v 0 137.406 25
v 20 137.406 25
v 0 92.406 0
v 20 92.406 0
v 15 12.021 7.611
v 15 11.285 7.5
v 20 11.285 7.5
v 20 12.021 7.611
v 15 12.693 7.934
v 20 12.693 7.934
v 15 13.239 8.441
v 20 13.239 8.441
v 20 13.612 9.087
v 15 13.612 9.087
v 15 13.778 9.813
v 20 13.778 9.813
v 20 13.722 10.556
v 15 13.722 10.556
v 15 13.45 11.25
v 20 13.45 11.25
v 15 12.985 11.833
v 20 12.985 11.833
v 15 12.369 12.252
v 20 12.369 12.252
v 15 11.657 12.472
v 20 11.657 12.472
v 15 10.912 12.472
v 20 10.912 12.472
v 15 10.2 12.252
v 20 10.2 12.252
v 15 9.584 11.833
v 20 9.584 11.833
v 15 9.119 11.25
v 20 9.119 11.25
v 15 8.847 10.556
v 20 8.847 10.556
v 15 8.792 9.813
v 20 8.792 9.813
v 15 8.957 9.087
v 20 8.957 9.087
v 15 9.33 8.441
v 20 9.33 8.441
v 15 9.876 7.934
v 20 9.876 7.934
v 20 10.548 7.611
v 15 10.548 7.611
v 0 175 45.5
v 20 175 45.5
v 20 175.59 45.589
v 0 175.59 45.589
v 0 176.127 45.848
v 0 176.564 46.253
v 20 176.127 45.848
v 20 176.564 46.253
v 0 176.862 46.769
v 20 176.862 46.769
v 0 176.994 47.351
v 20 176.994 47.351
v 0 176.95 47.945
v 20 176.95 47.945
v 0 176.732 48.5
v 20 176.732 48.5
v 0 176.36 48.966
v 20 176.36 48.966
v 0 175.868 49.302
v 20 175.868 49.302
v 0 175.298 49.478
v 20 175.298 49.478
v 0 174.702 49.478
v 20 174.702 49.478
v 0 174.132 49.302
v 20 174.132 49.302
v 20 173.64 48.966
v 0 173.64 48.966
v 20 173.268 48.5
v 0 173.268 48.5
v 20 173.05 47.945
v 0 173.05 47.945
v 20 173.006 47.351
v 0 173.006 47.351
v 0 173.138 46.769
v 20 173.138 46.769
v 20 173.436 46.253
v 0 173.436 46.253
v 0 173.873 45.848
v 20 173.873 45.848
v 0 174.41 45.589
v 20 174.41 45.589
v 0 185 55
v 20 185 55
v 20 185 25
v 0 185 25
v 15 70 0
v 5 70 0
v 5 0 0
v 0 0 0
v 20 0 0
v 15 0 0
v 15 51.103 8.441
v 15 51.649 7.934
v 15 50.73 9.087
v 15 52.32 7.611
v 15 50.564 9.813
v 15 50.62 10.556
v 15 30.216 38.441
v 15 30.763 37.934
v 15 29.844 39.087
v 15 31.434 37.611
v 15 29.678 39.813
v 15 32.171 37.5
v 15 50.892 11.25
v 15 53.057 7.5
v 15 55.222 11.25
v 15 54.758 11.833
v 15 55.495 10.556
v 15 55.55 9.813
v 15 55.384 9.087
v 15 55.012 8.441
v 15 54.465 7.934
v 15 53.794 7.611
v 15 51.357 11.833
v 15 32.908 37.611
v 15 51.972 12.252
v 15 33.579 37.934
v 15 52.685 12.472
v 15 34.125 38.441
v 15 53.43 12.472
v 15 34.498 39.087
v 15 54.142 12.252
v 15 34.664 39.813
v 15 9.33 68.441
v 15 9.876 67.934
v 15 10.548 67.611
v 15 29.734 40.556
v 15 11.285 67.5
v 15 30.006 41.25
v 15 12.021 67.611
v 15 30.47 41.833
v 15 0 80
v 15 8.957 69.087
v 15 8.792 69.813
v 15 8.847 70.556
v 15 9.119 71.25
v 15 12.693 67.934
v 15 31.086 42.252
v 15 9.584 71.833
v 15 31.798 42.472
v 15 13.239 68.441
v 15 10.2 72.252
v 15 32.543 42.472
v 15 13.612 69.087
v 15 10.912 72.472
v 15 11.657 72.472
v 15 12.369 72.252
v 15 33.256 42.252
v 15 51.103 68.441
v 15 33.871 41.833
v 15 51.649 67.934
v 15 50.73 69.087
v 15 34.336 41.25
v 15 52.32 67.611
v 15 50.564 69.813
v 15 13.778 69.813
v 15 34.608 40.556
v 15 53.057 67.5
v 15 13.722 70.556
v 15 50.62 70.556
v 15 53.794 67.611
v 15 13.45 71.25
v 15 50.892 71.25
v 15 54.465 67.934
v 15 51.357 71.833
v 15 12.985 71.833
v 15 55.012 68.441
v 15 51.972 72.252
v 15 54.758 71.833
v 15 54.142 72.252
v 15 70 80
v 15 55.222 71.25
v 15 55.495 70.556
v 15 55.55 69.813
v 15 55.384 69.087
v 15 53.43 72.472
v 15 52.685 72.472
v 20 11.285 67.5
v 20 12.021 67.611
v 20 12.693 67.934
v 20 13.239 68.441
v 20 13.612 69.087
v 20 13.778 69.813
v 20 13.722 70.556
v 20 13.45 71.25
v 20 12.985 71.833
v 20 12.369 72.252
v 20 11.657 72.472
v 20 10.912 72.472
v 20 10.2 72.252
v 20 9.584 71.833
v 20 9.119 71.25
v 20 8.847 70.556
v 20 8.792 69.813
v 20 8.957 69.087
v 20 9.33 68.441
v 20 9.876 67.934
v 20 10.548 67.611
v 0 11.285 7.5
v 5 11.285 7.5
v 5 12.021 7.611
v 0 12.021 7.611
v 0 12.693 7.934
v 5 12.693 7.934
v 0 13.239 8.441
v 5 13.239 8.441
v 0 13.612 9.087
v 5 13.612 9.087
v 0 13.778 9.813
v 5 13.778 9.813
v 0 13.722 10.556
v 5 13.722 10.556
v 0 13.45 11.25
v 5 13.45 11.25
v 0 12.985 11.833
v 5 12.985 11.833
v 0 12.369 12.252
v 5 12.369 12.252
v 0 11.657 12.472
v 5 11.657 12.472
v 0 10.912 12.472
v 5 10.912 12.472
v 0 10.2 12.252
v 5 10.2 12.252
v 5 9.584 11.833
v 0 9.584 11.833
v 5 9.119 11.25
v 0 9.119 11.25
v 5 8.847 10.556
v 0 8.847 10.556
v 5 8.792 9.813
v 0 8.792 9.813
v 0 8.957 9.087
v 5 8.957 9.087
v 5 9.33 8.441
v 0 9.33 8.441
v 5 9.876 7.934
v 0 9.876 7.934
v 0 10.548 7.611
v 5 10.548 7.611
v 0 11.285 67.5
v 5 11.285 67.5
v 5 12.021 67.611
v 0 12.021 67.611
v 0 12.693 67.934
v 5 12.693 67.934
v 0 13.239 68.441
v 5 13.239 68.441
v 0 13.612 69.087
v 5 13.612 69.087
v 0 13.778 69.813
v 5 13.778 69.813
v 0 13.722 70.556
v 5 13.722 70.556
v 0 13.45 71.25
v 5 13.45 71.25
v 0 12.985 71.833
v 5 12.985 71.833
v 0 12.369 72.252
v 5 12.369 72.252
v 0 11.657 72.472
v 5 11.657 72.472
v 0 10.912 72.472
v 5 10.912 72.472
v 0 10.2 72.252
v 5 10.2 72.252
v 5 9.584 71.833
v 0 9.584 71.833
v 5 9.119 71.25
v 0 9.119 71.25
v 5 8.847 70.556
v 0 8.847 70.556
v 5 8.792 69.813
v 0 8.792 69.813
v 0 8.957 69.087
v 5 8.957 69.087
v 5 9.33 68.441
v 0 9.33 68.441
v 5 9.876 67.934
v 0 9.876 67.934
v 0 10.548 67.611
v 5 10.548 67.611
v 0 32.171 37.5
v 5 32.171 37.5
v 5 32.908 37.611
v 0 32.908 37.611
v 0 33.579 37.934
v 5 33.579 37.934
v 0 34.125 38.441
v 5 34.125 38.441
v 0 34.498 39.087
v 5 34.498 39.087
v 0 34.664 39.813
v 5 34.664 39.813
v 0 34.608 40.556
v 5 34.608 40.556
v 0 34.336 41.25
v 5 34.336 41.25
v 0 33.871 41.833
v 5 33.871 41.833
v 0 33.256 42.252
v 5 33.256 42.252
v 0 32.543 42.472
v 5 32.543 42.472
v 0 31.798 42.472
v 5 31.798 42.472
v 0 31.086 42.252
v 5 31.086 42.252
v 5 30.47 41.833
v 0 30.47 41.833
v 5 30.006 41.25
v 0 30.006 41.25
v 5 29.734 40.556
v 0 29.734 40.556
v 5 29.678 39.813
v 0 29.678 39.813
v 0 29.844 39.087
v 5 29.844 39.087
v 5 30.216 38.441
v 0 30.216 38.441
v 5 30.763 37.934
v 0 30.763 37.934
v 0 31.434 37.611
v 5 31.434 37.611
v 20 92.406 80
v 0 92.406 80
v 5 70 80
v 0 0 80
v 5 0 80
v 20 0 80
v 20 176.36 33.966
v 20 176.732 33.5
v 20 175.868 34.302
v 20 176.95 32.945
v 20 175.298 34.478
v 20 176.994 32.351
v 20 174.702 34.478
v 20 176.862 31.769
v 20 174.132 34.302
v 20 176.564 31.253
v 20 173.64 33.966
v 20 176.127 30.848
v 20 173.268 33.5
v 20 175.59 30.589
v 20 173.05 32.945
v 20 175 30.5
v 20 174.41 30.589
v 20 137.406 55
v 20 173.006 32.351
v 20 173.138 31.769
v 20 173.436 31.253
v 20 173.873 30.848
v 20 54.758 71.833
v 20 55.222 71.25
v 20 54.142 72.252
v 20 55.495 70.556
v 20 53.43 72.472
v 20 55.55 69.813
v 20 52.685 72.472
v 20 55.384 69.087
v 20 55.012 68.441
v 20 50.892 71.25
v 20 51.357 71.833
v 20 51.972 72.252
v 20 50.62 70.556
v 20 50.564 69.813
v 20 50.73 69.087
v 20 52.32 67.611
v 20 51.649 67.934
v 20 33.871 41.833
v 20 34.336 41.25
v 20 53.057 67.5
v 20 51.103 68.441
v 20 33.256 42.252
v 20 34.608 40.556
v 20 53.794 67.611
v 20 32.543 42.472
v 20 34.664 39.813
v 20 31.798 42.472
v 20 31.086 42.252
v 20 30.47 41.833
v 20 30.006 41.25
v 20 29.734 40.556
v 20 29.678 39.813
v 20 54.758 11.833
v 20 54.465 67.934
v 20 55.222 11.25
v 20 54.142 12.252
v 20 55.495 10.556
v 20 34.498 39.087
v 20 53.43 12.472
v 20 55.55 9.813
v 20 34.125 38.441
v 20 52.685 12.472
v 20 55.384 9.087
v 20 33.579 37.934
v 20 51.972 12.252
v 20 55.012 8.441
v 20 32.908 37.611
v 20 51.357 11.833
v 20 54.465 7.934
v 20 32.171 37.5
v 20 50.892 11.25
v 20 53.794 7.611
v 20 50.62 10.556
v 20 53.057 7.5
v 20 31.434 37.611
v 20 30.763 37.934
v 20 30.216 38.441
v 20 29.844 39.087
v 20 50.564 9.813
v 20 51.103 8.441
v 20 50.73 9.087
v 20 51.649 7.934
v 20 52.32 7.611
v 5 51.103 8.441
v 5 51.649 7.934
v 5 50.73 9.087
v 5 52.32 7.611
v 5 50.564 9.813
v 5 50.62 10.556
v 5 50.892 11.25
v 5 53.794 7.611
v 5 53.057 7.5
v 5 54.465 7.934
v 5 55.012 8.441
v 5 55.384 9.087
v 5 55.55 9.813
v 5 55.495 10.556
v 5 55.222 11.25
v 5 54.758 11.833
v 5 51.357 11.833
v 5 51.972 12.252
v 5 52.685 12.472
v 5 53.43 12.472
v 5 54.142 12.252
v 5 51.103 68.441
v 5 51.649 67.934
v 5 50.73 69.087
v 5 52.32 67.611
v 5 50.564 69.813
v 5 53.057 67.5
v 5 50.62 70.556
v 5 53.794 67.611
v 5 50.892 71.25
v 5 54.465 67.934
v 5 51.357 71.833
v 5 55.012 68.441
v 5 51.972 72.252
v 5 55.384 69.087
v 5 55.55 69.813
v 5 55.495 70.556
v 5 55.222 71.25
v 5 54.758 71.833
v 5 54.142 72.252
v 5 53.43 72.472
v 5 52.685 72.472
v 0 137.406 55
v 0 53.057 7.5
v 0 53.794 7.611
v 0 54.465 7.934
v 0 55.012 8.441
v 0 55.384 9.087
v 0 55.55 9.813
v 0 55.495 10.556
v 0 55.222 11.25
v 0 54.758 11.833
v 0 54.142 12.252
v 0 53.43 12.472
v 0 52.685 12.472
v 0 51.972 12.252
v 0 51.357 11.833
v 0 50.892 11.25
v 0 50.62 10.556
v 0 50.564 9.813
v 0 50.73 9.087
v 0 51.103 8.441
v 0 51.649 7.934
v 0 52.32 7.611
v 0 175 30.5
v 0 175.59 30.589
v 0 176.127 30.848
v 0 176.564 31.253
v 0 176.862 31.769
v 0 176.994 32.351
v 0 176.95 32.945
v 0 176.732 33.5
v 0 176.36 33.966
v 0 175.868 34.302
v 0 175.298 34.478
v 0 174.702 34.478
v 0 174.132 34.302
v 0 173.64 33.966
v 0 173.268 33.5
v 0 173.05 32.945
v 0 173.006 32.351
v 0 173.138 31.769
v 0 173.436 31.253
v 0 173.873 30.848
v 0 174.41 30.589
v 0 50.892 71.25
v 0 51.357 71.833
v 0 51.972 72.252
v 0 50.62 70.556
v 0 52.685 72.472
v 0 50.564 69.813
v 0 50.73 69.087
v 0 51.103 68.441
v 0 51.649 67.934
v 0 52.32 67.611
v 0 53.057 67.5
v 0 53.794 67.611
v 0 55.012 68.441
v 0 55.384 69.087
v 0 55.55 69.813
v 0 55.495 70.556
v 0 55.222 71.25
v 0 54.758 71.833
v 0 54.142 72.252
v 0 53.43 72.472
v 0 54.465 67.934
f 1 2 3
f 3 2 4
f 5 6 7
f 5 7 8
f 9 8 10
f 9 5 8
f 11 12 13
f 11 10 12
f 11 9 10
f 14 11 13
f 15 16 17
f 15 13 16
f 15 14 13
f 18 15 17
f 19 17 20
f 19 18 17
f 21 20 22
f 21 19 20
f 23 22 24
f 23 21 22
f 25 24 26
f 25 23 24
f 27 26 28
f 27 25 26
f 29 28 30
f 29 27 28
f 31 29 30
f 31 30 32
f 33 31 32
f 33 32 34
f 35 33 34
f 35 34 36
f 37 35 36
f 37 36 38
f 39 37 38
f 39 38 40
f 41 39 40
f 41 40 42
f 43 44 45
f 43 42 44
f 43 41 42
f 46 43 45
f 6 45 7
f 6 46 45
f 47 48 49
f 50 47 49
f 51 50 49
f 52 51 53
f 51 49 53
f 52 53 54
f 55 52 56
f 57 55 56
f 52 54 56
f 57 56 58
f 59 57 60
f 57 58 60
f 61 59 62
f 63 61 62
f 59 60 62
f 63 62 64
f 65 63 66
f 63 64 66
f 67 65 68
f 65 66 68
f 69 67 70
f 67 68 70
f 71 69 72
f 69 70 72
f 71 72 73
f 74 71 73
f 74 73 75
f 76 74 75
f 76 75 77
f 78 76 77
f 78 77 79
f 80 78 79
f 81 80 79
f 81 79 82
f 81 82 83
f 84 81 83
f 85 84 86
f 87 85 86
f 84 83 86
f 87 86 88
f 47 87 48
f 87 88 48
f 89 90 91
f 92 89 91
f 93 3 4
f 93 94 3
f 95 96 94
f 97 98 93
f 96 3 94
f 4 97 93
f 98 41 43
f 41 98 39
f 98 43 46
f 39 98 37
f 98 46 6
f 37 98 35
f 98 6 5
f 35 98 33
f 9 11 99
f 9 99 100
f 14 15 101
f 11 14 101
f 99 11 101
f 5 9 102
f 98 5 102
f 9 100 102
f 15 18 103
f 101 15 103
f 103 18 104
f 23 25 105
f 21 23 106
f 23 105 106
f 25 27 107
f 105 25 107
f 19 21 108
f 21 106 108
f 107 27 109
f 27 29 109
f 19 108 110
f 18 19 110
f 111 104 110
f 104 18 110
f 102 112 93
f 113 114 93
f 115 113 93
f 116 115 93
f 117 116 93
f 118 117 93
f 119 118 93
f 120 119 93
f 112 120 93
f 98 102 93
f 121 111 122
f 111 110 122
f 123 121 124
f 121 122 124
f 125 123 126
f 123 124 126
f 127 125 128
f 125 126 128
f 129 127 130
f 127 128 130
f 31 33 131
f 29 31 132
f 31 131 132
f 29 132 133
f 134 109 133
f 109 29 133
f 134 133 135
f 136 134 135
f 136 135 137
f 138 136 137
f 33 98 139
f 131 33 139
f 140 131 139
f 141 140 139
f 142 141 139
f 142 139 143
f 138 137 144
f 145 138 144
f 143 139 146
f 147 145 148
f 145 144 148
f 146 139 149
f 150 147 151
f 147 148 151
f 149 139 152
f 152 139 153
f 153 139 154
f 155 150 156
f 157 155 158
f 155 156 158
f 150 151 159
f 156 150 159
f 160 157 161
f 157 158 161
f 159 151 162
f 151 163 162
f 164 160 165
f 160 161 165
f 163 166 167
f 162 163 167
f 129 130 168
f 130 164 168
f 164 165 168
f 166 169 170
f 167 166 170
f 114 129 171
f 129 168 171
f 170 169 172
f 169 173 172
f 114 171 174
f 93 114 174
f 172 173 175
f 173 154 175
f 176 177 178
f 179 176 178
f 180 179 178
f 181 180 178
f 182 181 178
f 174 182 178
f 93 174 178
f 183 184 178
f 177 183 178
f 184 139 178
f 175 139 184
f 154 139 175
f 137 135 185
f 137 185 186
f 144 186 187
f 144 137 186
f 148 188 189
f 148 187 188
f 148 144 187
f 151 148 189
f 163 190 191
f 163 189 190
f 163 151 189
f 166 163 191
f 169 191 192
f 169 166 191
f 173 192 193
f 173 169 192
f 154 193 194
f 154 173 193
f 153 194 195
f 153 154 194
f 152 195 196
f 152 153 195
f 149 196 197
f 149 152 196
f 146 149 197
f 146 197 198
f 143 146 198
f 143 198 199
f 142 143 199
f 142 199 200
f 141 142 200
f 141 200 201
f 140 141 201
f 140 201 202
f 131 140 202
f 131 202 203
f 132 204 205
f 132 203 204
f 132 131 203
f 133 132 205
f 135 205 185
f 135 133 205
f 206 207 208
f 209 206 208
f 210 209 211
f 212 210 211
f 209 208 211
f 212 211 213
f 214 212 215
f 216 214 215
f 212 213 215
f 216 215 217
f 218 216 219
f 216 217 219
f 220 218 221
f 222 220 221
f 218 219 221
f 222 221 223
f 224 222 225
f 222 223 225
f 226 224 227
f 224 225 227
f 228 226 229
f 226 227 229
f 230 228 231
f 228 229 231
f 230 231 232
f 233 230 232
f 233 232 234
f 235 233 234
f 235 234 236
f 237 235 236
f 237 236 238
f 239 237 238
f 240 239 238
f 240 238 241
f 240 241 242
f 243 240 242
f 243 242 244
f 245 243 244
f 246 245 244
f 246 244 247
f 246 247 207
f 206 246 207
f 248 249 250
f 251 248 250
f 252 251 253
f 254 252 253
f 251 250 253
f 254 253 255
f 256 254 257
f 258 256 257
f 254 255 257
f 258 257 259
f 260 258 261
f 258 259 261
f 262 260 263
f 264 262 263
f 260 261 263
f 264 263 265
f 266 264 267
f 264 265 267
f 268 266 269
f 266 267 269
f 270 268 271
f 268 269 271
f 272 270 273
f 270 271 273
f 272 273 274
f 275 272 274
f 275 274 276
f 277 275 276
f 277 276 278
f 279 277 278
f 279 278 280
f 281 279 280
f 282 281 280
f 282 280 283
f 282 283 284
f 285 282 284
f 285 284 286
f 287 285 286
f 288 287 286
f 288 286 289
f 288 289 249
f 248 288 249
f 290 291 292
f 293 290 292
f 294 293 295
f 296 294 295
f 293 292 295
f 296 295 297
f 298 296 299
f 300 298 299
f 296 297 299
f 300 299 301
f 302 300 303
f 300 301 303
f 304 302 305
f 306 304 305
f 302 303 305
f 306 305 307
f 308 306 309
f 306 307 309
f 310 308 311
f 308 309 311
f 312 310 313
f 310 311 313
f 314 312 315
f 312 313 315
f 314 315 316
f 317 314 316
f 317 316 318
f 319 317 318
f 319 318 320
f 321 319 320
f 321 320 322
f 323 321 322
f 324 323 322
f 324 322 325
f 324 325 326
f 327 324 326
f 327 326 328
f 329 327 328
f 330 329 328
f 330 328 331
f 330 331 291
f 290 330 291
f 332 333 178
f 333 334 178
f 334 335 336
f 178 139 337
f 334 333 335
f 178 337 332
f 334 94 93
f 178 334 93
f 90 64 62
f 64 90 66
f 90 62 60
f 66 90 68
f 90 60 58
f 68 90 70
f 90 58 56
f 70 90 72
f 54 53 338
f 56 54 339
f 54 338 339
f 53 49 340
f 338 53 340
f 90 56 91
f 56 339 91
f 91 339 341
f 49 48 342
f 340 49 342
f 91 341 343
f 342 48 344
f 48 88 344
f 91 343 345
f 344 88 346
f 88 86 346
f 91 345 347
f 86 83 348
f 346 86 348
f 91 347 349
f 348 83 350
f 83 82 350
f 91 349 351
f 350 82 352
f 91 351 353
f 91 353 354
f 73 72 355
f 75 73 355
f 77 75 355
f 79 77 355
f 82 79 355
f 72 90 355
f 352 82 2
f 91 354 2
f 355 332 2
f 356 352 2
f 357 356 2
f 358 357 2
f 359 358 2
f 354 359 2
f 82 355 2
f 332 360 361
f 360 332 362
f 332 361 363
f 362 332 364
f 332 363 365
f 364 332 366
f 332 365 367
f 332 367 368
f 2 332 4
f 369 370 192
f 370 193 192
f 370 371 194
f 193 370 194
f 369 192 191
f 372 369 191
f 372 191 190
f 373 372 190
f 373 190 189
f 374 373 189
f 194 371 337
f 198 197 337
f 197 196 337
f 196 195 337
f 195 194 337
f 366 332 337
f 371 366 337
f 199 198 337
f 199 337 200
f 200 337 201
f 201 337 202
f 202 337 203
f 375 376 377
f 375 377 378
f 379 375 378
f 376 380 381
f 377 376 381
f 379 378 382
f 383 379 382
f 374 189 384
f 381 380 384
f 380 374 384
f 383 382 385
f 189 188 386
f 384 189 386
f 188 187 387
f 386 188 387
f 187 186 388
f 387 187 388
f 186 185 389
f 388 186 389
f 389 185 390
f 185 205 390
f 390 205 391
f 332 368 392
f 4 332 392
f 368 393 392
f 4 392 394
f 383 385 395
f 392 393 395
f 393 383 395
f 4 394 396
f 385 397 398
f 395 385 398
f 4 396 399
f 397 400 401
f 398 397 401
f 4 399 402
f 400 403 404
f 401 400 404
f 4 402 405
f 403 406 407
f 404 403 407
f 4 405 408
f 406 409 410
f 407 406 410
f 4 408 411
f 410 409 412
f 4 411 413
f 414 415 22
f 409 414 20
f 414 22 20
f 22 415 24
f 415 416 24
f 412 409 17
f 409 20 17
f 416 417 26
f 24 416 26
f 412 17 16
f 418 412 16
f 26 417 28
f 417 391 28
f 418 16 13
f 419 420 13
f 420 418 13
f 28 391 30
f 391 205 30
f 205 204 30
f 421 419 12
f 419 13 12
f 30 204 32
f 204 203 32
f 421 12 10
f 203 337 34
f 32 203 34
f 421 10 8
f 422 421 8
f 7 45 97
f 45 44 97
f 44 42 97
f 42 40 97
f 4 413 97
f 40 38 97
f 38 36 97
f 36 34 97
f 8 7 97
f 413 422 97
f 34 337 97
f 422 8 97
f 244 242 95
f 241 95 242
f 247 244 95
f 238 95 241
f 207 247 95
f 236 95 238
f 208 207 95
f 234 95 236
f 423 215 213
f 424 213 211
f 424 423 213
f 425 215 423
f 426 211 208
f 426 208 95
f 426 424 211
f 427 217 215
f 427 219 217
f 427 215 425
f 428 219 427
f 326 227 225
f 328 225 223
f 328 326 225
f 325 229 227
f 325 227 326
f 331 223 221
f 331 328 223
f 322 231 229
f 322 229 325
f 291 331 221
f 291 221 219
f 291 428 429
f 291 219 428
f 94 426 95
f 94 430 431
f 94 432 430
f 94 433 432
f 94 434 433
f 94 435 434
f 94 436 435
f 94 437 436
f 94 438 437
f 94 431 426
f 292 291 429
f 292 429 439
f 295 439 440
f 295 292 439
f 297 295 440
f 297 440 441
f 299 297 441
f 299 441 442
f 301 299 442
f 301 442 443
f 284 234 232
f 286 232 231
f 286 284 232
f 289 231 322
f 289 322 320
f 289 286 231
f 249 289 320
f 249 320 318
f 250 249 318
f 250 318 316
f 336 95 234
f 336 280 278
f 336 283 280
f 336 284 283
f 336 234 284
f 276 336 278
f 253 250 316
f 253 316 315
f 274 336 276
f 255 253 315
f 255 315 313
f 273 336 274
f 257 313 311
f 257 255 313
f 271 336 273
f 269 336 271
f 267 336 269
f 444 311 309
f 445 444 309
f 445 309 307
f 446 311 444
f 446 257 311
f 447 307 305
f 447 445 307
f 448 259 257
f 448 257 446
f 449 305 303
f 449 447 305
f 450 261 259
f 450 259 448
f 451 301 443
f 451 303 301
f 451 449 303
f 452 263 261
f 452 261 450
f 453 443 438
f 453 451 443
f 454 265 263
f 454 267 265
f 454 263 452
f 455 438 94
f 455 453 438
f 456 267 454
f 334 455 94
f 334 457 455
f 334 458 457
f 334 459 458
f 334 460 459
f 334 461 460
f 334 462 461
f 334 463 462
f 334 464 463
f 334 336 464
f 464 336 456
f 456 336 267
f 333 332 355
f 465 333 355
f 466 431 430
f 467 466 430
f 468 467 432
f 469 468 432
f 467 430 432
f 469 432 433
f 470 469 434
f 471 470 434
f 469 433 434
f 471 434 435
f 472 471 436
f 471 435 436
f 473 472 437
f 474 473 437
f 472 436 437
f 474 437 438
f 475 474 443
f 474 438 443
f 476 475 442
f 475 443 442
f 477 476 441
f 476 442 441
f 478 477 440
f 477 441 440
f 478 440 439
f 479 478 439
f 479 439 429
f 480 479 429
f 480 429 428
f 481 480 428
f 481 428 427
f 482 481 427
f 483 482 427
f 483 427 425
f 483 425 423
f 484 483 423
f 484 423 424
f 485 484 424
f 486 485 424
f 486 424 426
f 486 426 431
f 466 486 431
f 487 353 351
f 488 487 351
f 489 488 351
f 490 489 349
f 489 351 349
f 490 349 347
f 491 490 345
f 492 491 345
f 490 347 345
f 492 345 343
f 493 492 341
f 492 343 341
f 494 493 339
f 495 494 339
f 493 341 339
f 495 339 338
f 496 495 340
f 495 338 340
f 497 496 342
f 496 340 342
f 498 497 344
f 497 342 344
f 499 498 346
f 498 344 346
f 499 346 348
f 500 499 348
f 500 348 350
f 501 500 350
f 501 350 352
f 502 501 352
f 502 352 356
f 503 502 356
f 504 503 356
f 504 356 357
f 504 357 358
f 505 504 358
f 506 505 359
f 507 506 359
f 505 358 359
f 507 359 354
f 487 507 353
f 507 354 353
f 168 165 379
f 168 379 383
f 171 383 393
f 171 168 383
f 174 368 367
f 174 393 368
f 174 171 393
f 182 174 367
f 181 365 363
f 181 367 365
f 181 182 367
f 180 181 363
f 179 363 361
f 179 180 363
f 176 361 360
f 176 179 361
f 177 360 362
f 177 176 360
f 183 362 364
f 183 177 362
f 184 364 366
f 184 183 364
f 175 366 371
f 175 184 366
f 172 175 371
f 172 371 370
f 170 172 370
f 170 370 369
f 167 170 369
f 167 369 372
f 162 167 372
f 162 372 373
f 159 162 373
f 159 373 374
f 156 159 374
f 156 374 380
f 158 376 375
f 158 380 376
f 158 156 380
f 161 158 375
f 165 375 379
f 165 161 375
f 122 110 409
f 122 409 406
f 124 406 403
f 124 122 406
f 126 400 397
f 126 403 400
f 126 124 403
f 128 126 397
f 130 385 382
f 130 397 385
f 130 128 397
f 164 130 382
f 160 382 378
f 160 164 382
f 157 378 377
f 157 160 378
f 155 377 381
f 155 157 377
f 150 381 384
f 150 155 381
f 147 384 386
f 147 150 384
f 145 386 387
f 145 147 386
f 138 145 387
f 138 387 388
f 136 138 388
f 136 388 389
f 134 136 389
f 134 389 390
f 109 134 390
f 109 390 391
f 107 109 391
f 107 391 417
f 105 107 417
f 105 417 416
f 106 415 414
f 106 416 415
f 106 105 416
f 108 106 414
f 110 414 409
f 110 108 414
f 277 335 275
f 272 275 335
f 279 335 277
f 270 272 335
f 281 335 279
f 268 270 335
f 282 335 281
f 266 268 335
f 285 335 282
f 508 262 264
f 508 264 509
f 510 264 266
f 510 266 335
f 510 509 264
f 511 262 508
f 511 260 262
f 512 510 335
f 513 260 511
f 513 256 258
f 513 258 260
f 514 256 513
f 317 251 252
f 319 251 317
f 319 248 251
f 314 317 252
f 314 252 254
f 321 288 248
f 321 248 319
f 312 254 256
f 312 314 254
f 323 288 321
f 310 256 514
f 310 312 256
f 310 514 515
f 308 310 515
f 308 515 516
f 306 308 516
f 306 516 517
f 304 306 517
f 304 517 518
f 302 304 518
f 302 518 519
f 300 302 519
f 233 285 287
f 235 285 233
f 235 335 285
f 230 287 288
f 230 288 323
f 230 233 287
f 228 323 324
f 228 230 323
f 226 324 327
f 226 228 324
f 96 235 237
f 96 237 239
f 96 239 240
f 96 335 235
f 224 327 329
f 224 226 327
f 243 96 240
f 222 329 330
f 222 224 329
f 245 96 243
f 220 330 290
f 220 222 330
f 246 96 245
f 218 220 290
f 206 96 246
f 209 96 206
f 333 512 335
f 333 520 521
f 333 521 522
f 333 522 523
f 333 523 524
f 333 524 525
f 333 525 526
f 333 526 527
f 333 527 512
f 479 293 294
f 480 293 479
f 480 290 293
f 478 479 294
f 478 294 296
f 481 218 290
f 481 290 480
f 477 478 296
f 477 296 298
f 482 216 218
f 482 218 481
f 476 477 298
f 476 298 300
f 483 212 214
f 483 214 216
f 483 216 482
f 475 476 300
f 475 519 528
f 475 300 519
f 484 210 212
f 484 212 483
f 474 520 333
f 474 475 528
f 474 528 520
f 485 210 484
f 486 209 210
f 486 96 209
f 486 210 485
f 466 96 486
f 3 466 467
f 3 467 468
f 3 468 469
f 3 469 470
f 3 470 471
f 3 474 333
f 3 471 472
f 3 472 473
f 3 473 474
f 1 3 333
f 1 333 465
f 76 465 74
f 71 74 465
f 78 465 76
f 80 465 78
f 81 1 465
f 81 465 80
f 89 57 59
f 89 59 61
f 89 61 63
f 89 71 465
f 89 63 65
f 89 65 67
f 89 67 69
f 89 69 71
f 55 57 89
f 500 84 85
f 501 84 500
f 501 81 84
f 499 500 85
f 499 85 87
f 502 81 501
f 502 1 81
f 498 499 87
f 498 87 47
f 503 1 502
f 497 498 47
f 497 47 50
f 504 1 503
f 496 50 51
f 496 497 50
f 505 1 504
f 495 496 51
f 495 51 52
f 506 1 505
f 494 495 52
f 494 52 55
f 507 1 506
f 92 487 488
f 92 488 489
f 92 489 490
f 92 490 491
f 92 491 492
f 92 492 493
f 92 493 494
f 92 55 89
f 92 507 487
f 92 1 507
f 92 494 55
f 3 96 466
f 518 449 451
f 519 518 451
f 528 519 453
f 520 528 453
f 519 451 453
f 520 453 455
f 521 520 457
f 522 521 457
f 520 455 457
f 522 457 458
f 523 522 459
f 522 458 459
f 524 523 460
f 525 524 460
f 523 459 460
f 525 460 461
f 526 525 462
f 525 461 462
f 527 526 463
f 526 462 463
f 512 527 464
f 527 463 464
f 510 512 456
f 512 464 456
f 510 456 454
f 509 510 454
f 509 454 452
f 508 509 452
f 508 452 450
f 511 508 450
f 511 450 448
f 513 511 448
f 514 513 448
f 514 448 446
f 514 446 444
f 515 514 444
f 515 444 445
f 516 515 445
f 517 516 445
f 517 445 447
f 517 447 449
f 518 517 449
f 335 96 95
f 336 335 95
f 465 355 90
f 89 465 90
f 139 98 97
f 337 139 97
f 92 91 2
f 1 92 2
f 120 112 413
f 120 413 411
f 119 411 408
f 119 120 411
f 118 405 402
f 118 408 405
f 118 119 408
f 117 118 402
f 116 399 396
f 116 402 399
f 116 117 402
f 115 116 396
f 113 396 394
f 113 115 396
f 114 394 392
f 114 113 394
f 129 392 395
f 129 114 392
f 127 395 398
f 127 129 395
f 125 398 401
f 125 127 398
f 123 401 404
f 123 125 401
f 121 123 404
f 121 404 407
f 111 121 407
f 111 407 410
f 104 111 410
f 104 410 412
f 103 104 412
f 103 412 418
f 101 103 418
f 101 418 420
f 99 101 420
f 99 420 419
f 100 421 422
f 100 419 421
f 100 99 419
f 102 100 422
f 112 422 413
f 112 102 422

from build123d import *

# Parameters (mm, degrees)
SUPPORT_BALISE_W                           = 20
SUPPORT_BALISE_H                           = 350
SUPPORT_BALISE_BOSSAGE_DEPTH               = 80
ESQUISSE3_W                                = 80
ESQUISSE3_H                                = 80
SUPPORT_CHEVAL_ENLEVEMENT_DE_MATIERE_DEPTH = 10
ESQUISSE8_W                                = 10
ESQUISSE8_H                                = 70
SUPPORT_CHEVAL_DEPTH                       = 80
VIS_REACH                                  = 376.466
SERRAGE_VIS_R                              = 2.5
VIS_DIRECTION_2_DEPTH                      = 375.466286867
ENL_V_MAT_EXTRU_5_DEPTH                    = 20
POUR_IMPRESSION_R                          = 15
FIXATION_POUR_ASSEMBLAGE_R                 = 2
VIS_POUR_ASSEMBLAGE_DEPTH                  = 20
ESQUISSE13_R                               = 2
ENL_V_MAT_EXTRU_10_DEPTH                   = 463


with BuildPart() as part:
    # Support Balise → Support balise bossage (new body)
    with BuildSketch(Plane.XY):
        with Locations((10, 175)):
            Rectangle(SUPPORT_BALISE_W, SUPPORT_BALISE_H)
    extrude(amount=SUPPORT_BALISE_BOSSAGE_DEPTH)

    # Esquisse3 → Support Cheval enlevement de matiere (add)
    with BuildSketch(Plane(origin=(0, 350, 0), x_dir=(1, 0, 0), z_dir=(0, 1, 0))):
        with Locations((-20, -40)):
            Rectangle(ESQUISSE3_W, ESQUISSE3_H)
    extrude(amount=SUPPORT_CHEVAL_ENLEVEMENT_DE_MATIERE_DEPTH)

    # Esquisse8 → Support Cheval (cut)
    with BuildSketch(Plane.XY.offset(80)):
        with Locations((10, 35)):
            Rectangle(ESQUISSE8_W, ESQUISSE8_H)
    extrude(amount=-SUPPORT_CHEVAL_DEPTH, mode=Mode.SUBTRACT)

    # Vis: up to this face of the body (flat: up to its plane)
    vis_end = Plane(part.part.faces().sort_by_distance((0, 175, 40))[0])
    # Serrage vis → Vis (cut, up to the picked face)
    with BuildSketch(Plane(origin=(5, 0, 0), x_dir=(0, 0, -1), z_dir=(1, 0, 0)), mode=Mode.PRIVATE) as vis_sk1:
        with Locations((-70, 11.284552026)):
            Circle(SERRAGE_VIS_R)
    vis_tool1 = split(extrude(vis_sk1.sketch, amount=-VIS_REACH, mode=Mode.PRIVATE), bisect_by=vis_end, keep=Keep.BOTH, mode=Mode.PRIVATE)
    # Serrage vis → Vis (cut, up to the picked face)
    with BuildSketch(Plane(origin=(5, 0, 0), x_dir=(0, 0, -1), z_dir=(1, 0, 0)), mode=Mode.PRIVATE) as vis_sk2:
        with Locations((-70, 53.057184379)):
            Circle(SERRAGE_VIS_R)
    vis_tool2 = split(extrude(vis_sk2.sketch, amount=-VIS_REACH, mode=Mode.PRIVATE), bisect_by=vis_end, keep=Keep.BOTH, mode=Mode.PRIVATE)
    # Serrage vis → Vis (cut, up to the picked face)
    with BuildSketch(Plane(origin=(5, 0, 0), x_dir=(0, 0, -1), z_dir=(1, 0, 0)), mode=Mode.PRIVATE) as vis_sk3:
        with Locations((-10, 53.057184379)):
            Circle(SERRAGE_VIS_R)
    vis_tool3 = split(extrude(vis_sk3.sketch, amount=-VIS_REACH, mode=Mode.PRIVATE), bisect_by=vis_end, keep=Keep.BOTH, mode=Mode.PRIVATE)
    # Serrage vis → Vis (cut, up to the picked face)
    with BuildSketch(Plane(origin=(5, 0, 0), x_dir=(0, 0, -1), z_dir=(1, 0, 0)), mode=Mode.PRIVATE) as vis_sk4:
        with Locations((-10, 11.284552026)):
            Circle(SERRAGE_VIS_R)
    vis_tool4 = split(extrude(vis_sk4.sketch, amount=-VIS_REACH, mode=Mode.PRIVATE), bisect_by=vis_end, keep=Keep.BOTH, mode=Mode.PRIVATE)
    # Serrage vis → Vis (cut, up to the picked face)
    with BuildSketch(Plane(origin=(5, 0, 0), x_dir=(0, 0, -1), z_dir=(1, 0, 0)), mode=Mode.PRIVATE) as vis_sk5:
        with Locations((-40, 32.170868202)):
            Circle(SERRAGE_VIS_R)
    vis_tool5 = split(extrude(vis_sk5.sketch, amount=-VIS_REACH, mode=Mode.PRIVATE), bisect_by=vis_end, keep=Keep.BOTH, mode=Mode.PRIVATE)
    add(vis_tool1.solids().sort_by(Axis((5, 11.284552, 70), (-1, 0, 0)))[0], mode=Mode.SUBTRACT)
    add(vis_tool2.solids().sort_by(Axis((5, 53.057184, 70), (-1, 0, 0)))[0], mode=Mode.SUBTRACT)
    add(vis_tool3.solids().sort_by(Axis((5, 53.057184, 10), (-1, 0, 0)))[0], mode=Mode.SUBTRACT)
    add(vis_tool4.solids().sort_by(Axis((5, 11.284552, 10), (-1, 0, 0)))[0], mode=Mode.SUBTRACT)
    add(vis_tool5.solids().sort_by(Axis((5, 32.170868, 40), (-1, 0, 0)))[0], mode=Mode.SUBTRACT)

    # Serrage vis → Vis direction 2 (cut)
    with BuildSketch(Plane(origin=(5, 0, 0), x_dir=(0, 0, -1), z_dir=(1, 0, 0))):
        with Locations((-70, 11.284552026)):
            Circle(SERRAGE_VIS_R)
        with Locations((-70, 53.057184379)):
            Circle(SERRAGE_VIS_R)
        with Locations((-10, 53.057184379)):
            Circle(SERRAGE_VIS_R)
        with Locations((-10, 11.284552026)):
            Circle(SERRAGE_VIS_R)
        with Locations((-40, 32.170868202)):
            Circle(SERRAGE_VIS_R)
    extrude(amount=VIS_DIRECTION_2_DEPTH, mode=Mode.SUBTRACT)

    # Design → Enlèv. mat.-Extru.5 (cut)
    with BuildSketch(Plane(origin=(20, 0, 0), x_dir=(0, 0, -1), z_dir=(1, 0, 0))):
        Polygon((-55, 315), (-80, 360), (-80, 92.406088827), (-55, 137.406088827), align=None)
        Polygon((0, 92.406088827), (0, 360), (-25, 315), (-25, 137.406088827), align=None)
    extrude(amount=-ENL_V_MAT_EXTRU_5_DEPTH, mode=Mode.SUBTRACT)

    # Pour Impression
    # the kernel refuses this fillet: 15 mm, written as the material it adds along each edge
    with BuildSketch(Plane(origin=(0, 392.780897855, -18.211609919), x_dir=(1, 0, 0), z_dir=(0, -0.8741572761215375, 0.48564293117863266))) as pour_impression_piece_1_section:
        with BuildLine():
            CenterArc((POUR_IMPRESSION_R, -POUR_IMPRESSION_R), POUR_IMPRESSION_R, 90, 90)
            Line((0, -POUR_IMPRESSION_R), (0, 0))
            Line((0, 0), (POUR_IMPRESSION_R, 0))
        make_face()
    pour_impression_piece_1 = extrude(amount=86.439589046, mode=Mode.PRIVATE)
    pour_impression_piece_1 = split(pour_impression_piece_1, bisect_by=Plane(origin=(4.741525676, 350, 2.029382941), z_dir=(0, 1, 0)), keep=Keep.TOP, mode=Mode.PRIVATE)
    pour_impression_piece_1 = split(pour_impression_piece_1, bisect_by=Plane(origin=(4.741525676, 353.652889294, 0), z_dir=(0, 0, 1)), keep=Keep.TOP, mode=Mode.PRIVATE)
    add(pour_impression_piece_1)
    with BuildSketch(Plane(origin=(0, 317.219102145, 56.232834525), x_dir=(1, 0, 0), z_dir=(0, 0.8741572761215377, 0.4856429311786322))) as pour_impression_piece_2_section:
        with BuildLine():
            CenterArc((POUR_IMPRESSION_R, -POUR_IMPRESSION_R), POUR_IMPRESSION_R, 90, 90)
            Line((0, -POUR_IMPRESSION_R), (0, 0))
            Line((0, 0), (POUR_IMPRESSION_R, 0))
        make_face()
    pour_impression_piece_2 = extrude(amount=86.439589046, mode=Mode.PRIVATE)
    pour_impression_piece_2 = split(pour_impression_piece_2, bisect_by=Plane(origin=(4.741525676, 350, 77.970617059), z_dir=(0, 1, 0)), keep=Keep.TOP, mode=Mode.PRIVATE)
    pour_impression_piece_2 = split(pour_impression_piece_2, bisect_by=Plane(origin=(4.741525676, 353.652889294, 80), z_dir=(0, 0, -1)), keep=Keep.TOP, mode=Mode.PRIVATE)
    add(pour_impression_piece_2)

    # Fixation pour assemblage → Vis pour Assemblage (cut)
    with BuildSketch(Plane(origin=(20, 0, 0), x_dir=(0, 0, -1), z_dir=(1, 0, 0))):
        with Locations((-47.5, 195)):
            Circle(FIXATION_POUR_ASSEMBLAGE_R)
        with Locations((-32.5, 195)):
            Circle(FIXATION_POUR_ASSEMBLAGE_R)
        with Locations((-32.5, 175)):
            Circle(FIXATION_POUR_ASSEMBLAGE_R)
        with Locations((-47.5, 175)):
            Circle(FIXATION_POUR_ASSEMBLAGE_R)
    extrude(amount=-VIS_POUR_ASSEMBLAGE_DEPTH, mode=Mode.SUBTRACT)

    # Esquisse13 → Enlèv. mat.-Extru.10 (cut)
    # profile 1 of 2: a face of its own
    with BuildSketch(Plane(origin=(20, 0, 0), x_dir=(0, 0, -1), z_dir=(1, 0, 0))):
        Polygon((-174.897376457, 185), (-55, 185), (-55, 315), (-80, 360), (0, 360), (-25, 315), (-25, 185), (122.454281653, 185), (122.454281653, 440.420380727), (-174.897376457, 440.420380727), align=None)
    # profile 2 of 2: a face of its own
    with BuildSketch(Plane(origin=(20, 0, 0), x_dir=(0, 0, -1), z_dir=(1, 0, 0))):
        Polygon((-55, 315), (-55, 185), (-25, 185), (-25, 315), (0, 360), (-80, 360), align=None)
        with Locations((-47.5, 195)):
            Circle(ESQUISSE13_R, mode=Mode.SUBTRACT)
        with Locations((-32.5, 195)):
            Circle(ESQUISSE13_R, mode=Mode.SUBTRACT)
    extrude(amount=-ENL_V_MAT_EXTRU_10_DEPTH, mode=Mode.SUBTRACT)


solid = part.part
